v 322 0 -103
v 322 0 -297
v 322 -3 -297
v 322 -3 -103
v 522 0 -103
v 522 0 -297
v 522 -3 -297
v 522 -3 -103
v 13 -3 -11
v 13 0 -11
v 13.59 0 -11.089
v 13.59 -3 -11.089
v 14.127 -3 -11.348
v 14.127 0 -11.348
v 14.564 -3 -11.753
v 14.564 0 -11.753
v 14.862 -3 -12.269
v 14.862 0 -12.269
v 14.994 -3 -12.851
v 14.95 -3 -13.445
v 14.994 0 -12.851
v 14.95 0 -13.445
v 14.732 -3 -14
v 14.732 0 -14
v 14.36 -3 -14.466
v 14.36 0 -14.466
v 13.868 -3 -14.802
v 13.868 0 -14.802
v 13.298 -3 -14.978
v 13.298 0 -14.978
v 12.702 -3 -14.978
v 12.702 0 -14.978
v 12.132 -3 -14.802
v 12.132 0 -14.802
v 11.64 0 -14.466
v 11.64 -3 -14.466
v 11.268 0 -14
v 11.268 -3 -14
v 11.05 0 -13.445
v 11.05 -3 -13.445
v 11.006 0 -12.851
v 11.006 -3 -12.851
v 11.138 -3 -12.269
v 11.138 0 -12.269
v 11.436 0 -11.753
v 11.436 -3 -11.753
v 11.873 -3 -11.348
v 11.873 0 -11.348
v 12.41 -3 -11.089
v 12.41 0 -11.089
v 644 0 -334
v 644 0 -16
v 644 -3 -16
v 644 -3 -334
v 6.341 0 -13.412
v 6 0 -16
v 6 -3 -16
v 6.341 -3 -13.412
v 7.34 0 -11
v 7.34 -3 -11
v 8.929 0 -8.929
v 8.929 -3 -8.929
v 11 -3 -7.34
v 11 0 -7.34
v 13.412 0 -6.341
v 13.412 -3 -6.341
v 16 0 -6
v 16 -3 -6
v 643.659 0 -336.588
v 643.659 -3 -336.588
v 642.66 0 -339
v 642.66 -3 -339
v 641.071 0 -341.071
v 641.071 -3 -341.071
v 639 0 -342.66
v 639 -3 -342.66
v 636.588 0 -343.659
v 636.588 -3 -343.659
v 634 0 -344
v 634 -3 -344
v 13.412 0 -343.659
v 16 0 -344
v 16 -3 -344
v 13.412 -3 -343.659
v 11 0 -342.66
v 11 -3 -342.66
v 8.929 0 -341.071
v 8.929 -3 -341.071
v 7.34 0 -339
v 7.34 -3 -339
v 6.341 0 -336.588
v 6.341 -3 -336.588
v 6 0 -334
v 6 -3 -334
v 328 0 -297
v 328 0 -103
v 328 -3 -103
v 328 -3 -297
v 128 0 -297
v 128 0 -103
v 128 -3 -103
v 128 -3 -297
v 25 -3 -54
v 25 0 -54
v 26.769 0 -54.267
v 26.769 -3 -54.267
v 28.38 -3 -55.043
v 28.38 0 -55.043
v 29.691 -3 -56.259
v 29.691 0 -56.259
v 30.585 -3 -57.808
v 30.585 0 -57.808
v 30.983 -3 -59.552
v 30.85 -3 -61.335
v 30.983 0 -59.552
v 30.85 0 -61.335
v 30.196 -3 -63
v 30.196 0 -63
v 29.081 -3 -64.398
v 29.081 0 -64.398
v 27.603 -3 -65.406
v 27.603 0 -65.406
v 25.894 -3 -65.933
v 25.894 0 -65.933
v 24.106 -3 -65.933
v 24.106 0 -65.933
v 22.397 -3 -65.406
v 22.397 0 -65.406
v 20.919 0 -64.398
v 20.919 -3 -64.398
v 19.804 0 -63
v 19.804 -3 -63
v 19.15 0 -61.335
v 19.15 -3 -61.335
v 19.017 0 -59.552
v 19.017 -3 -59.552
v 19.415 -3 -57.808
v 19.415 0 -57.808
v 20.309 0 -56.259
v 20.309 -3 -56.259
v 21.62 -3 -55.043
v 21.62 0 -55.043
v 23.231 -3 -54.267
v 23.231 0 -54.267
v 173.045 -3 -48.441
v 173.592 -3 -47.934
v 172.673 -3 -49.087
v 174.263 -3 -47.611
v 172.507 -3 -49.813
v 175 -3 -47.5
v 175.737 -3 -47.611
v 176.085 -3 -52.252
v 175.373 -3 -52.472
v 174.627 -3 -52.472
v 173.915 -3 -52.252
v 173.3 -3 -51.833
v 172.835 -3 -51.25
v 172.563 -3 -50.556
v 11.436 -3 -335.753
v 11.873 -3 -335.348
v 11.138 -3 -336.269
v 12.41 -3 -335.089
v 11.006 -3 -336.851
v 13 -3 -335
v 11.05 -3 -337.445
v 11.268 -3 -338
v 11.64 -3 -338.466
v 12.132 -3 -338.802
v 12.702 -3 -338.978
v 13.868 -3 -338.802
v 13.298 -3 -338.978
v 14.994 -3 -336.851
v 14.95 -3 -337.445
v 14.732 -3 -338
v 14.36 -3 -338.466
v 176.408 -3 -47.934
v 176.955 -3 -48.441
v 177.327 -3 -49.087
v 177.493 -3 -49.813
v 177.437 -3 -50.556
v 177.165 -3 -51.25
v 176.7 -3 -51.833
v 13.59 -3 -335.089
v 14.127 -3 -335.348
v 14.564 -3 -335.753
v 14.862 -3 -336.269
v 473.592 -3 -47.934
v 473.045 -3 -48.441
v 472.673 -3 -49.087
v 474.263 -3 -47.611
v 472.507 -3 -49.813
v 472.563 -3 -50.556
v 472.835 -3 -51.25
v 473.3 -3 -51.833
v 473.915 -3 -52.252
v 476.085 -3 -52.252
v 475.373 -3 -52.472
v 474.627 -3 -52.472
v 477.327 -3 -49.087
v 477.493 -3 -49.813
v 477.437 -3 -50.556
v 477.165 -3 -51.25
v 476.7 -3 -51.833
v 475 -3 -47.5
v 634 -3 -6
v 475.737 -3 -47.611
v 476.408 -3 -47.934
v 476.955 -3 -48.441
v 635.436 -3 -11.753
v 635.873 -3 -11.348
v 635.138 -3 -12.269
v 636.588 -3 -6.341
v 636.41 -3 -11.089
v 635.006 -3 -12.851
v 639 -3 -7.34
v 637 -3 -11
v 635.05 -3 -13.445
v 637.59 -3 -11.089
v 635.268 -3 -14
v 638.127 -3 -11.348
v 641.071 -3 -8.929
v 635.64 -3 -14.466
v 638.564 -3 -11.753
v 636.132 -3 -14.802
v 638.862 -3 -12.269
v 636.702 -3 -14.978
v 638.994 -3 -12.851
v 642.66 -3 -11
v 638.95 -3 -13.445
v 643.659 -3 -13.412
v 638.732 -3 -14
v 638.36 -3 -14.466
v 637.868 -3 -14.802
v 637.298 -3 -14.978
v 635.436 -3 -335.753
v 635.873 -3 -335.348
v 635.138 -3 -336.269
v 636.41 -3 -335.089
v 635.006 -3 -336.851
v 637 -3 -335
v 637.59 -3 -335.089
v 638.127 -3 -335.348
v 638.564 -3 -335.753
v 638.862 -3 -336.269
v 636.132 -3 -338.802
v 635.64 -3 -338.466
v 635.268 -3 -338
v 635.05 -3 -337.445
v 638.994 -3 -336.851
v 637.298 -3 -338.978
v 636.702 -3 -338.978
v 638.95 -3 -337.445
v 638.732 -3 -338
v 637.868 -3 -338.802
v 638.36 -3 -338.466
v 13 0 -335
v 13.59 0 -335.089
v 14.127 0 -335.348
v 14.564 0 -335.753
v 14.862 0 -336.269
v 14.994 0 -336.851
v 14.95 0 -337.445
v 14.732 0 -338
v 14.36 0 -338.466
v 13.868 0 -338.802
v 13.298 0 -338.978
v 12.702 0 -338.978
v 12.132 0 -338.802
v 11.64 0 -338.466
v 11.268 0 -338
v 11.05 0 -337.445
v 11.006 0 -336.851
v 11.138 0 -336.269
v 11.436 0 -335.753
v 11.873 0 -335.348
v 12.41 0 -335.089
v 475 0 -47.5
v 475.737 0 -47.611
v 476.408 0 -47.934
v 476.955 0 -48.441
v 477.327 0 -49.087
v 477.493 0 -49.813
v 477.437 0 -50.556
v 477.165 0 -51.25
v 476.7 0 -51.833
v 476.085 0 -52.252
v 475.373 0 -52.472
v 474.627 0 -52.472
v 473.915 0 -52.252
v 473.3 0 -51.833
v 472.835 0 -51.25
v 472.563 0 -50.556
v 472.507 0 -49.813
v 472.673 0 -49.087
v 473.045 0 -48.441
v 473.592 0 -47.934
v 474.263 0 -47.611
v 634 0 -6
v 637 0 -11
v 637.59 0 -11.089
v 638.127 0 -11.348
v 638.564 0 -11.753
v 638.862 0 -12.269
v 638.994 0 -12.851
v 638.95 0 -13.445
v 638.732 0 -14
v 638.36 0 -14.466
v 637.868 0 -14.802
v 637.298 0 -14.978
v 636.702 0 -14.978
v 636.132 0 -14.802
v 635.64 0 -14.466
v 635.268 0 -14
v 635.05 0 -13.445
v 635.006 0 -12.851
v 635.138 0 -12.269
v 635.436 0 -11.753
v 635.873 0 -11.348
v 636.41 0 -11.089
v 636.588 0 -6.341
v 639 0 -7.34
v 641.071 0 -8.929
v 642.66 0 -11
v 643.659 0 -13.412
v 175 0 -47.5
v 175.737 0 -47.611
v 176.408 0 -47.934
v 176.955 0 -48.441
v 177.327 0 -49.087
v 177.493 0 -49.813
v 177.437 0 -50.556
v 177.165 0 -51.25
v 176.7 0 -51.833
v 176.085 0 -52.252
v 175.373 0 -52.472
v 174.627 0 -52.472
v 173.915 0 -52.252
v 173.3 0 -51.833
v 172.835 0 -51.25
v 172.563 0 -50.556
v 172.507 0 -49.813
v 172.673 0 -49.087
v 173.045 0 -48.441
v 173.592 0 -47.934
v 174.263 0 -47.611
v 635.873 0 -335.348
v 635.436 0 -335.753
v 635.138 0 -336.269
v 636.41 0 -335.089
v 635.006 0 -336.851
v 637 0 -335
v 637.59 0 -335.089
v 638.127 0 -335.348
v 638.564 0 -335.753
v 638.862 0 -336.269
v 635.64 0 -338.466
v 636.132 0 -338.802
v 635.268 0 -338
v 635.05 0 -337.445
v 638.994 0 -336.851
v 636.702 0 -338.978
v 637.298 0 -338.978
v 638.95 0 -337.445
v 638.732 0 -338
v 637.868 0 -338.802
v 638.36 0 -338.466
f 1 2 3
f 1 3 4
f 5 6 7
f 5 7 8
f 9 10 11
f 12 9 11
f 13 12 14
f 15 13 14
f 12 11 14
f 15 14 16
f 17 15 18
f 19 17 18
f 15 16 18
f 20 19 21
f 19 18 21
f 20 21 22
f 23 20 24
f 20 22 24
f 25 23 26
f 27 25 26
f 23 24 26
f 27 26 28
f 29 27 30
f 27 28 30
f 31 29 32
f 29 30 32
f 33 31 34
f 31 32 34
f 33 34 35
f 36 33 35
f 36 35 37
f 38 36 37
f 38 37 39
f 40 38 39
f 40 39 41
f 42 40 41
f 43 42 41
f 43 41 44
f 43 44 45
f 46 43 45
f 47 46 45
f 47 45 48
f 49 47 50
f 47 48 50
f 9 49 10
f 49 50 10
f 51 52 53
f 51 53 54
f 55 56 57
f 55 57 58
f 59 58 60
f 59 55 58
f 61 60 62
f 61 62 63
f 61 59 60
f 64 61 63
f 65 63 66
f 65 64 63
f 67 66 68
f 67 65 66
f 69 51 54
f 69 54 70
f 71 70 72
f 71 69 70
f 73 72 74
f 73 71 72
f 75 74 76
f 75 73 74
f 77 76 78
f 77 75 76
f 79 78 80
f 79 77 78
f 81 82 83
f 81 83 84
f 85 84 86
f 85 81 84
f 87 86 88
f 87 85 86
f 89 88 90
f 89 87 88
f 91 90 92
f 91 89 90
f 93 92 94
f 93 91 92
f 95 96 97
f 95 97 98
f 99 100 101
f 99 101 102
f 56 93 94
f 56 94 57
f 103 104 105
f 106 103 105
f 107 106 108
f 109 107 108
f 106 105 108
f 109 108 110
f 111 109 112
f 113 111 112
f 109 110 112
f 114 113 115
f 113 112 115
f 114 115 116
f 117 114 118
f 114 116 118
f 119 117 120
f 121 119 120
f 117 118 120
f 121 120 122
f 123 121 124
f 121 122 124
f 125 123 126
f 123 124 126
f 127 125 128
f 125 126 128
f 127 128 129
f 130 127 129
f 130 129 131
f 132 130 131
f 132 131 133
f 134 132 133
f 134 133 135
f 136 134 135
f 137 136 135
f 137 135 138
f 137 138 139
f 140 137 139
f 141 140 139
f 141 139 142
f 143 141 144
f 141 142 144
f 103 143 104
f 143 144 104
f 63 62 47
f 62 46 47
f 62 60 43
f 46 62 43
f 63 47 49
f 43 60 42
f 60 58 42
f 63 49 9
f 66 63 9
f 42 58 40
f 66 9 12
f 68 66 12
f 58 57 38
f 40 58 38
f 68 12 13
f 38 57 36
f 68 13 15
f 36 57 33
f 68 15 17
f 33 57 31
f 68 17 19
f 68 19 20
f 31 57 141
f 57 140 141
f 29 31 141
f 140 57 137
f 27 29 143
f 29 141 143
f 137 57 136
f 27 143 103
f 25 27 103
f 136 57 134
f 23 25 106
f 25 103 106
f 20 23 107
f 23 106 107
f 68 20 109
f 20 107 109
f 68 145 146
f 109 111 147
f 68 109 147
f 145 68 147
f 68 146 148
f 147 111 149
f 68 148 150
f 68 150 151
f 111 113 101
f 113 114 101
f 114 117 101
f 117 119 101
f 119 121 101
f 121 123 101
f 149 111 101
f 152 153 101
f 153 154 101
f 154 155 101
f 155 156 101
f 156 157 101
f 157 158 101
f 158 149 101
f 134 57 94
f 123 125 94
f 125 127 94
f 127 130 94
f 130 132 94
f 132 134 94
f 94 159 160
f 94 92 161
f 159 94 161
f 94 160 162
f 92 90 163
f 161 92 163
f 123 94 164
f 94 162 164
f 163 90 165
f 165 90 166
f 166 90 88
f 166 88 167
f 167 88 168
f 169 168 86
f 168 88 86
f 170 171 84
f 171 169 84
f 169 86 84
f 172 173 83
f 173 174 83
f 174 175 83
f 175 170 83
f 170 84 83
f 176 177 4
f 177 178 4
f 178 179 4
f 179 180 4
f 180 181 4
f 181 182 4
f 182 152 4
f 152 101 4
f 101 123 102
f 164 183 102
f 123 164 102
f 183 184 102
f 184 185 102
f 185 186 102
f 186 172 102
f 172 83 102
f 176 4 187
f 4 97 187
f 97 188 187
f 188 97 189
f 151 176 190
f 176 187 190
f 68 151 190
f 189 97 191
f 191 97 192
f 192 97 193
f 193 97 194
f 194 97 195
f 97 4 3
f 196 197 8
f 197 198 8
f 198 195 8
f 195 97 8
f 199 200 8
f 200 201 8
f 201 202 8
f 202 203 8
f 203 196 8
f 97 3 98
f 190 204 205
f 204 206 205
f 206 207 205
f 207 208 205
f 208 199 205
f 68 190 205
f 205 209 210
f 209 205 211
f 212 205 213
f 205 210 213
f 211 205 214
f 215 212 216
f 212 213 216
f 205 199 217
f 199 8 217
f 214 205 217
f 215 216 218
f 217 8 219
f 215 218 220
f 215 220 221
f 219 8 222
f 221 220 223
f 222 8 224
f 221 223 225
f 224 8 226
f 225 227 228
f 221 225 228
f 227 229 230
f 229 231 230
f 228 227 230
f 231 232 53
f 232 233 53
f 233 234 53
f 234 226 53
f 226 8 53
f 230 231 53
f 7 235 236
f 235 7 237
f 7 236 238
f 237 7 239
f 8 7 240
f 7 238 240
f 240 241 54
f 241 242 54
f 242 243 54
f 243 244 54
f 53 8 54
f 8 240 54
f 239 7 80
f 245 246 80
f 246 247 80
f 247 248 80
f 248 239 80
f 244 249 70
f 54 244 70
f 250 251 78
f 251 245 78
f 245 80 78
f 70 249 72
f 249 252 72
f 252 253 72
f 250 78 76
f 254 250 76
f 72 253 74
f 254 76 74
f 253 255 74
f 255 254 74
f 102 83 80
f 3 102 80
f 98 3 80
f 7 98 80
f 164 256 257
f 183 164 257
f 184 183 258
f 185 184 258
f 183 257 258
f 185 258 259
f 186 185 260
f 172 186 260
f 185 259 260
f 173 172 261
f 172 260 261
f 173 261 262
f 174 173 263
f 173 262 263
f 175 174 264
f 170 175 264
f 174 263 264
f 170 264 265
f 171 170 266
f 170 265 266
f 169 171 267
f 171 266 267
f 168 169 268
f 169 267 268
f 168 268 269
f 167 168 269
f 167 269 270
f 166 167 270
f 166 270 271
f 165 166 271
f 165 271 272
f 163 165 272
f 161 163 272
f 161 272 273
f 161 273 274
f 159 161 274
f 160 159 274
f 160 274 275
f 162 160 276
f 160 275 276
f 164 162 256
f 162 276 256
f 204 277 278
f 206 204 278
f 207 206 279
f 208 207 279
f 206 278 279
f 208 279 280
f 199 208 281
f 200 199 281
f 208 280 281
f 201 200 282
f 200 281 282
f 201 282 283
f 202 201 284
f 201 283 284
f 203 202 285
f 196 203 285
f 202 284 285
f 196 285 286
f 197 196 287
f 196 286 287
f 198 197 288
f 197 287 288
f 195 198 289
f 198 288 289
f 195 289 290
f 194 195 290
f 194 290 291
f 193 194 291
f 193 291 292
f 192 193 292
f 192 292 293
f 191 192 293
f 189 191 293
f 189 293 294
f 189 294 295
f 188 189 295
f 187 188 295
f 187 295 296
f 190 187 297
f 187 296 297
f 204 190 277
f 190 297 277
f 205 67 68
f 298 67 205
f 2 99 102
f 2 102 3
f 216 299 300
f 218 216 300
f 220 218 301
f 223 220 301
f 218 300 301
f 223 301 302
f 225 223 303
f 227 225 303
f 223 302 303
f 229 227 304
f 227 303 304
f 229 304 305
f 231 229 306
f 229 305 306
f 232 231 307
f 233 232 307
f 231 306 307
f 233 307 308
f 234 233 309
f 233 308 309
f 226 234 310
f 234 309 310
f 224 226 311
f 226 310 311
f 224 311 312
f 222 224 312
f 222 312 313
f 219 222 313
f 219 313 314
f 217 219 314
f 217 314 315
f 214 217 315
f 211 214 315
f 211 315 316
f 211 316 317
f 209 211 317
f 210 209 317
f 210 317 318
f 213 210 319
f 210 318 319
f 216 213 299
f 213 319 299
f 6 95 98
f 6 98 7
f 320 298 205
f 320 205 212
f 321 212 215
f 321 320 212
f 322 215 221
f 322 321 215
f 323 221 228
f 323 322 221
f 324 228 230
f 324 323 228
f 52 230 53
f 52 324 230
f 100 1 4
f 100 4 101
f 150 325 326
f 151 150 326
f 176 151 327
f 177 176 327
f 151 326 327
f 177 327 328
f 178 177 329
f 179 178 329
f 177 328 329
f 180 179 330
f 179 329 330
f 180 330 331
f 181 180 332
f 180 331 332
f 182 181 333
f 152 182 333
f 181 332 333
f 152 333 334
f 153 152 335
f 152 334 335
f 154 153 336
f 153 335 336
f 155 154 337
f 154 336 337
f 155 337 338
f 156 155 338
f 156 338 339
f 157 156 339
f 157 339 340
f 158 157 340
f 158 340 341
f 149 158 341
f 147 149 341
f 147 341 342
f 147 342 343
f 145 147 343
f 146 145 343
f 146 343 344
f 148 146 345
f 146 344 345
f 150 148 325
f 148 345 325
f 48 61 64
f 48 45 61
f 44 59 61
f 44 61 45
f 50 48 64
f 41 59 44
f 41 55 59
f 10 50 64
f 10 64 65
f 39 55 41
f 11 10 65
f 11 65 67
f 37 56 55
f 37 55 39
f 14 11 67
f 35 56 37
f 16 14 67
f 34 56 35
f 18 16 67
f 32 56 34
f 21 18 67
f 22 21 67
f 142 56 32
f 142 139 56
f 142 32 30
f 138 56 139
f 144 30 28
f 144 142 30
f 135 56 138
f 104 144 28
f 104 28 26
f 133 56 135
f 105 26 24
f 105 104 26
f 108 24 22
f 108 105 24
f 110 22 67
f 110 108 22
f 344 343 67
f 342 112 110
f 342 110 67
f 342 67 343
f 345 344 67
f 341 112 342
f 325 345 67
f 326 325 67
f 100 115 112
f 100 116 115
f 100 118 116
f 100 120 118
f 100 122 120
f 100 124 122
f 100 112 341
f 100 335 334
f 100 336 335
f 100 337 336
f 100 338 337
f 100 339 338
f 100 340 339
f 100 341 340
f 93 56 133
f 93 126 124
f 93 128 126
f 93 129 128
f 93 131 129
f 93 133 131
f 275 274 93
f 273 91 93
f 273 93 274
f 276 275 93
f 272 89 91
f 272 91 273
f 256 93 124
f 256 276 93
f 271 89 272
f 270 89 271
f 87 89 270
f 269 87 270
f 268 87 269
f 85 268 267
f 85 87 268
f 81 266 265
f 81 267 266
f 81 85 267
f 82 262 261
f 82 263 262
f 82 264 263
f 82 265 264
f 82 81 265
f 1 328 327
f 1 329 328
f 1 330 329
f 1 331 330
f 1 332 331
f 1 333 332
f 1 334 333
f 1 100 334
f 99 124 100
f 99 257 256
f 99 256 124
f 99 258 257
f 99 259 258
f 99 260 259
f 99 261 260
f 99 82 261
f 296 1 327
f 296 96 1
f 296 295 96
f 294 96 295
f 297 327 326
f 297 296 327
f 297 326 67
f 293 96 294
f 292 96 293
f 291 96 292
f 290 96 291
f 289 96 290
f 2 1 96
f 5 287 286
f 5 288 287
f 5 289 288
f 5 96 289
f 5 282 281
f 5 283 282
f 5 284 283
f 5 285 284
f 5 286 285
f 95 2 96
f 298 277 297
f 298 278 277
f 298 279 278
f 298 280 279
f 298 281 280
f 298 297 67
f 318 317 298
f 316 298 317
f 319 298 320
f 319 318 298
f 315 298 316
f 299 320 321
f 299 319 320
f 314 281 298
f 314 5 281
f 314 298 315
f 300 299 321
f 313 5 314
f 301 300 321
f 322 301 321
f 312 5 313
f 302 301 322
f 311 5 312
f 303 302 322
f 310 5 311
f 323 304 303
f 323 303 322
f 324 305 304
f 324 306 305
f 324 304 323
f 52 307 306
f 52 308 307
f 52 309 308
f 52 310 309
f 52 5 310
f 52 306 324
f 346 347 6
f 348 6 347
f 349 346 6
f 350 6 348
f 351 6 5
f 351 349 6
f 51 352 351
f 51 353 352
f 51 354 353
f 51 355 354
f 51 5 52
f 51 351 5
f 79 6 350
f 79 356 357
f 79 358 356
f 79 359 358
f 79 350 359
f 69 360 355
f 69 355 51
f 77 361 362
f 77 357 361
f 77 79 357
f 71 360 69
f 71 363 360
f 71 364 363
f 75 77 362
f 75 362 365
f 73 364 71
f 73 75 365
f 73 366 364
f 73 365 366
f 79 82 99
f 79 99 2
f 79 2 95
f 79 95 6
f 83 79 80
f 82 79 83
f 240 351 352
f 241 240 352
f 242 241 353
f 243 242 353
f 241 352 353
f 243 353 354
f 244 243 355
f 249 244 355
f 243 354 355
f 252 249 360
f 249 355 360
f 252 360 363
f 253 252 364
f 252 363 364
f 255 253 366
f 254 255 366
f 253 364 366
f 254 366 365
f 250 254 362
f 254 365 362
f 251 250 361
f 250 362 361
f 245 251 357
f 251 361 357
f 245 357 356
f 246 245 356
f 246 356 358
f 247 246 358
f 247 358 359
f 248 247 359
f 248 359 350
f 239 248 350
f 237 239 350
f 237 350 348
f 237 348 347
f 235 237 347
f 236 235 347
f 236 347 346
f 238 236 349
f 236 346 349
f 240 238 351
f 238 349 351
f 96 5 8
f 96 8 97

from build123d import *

# Parameters (mm, degrees)
SKETCH_1_R      = 2
SKETCH_1_R_2    = 6
SKETCH_1_R_3    = 2.5
EXTRUDE_1_DEPTH = 3


with BuildPart() as part:
    # 草图1 → 凸台-拉伸1 (new body)
    with BuildSketch(Plane(origin=(0, 0, 0), x_dir=(1, 0, 0), z_dir=(0, 1, 0))):
        with BuildLine():
            Line((630, 344), (20, 344))
            Line((20, 344), (16, 344))
            ThreePointArc((16, 344), (8.928932188, 341.071067812), (6, 334))
            Line((6, 334), (6, 330))
            Line((6, 330), (6, 20))
            Line((6, 20), (6, 16))
            ThreePointArc((6, 16), (8.928932188, 8.928932188), (16, 6))
            Line((16, 6), (20, 6))
            Line((20, 6), (630, 6))
            Line((630, 6), (634, 6))
            ThreePointArc((634, 6), (641.071067812, 8.928932188), (644, 16))
            Line((644, 16), (644, 20))
            Line((644, 20), (644, 330))
            Line((644, 330), (644, 334))
            ThreePointArc((644, 334), (641.071067812, 341.071067812), (634, 344))
            Line((634, 344), (630, 344))
        make_face()
        with Locations(Location((13, 13, 0), (0, 0, 270))):
            Circle(SKETCH_1_R, mode=Mode.SUBTRACT)
        with Locations(Location((25, 60, 0), (0, 0, 270))):
            Circle(SKETCH_1_R_2, mode=Mode.SUBTRACT)
        with Locations(Location((175, 50, 0), (0, 0, 270))):
            Circle(SKETCH_1_R_3, mode=Mode.SUBTRACT)
        with Locations(Location((475, 50, 0), (0, 0, 270))):
            Circle(SKETCH_1_R_3, mode=Mode.SUBTRACT)
        with Locations(Location((637, 13, 0), (0, 0, 270))):
            Circle(SKETCH_1_R, mode=Mode.SUBTRACT)
        Polygon((322, 297), (322, 175), (322, 103), (128, 103), (128, 297), align=None, mode=Mode.SUBTRACT)
        with Locations(Location((13, 337, 0), (0, 0, 270))):
            Circle(SKETCH_1_R, mode=Mode.SUBTRACT)
        Polygon((522, 297), (522, 103), (328, 103), (328, 175), (328, 297), align=None, mode=Mode.SUBTRACT)
        with Locations(Location((637, 337, 0), (0, 0, 270))):
            Circle(SKETCH_1_R, mode=Mode.SUBTRACT)
    extrude(amount=-EXTRUDE_1_DEPTH)


solid = part.part
